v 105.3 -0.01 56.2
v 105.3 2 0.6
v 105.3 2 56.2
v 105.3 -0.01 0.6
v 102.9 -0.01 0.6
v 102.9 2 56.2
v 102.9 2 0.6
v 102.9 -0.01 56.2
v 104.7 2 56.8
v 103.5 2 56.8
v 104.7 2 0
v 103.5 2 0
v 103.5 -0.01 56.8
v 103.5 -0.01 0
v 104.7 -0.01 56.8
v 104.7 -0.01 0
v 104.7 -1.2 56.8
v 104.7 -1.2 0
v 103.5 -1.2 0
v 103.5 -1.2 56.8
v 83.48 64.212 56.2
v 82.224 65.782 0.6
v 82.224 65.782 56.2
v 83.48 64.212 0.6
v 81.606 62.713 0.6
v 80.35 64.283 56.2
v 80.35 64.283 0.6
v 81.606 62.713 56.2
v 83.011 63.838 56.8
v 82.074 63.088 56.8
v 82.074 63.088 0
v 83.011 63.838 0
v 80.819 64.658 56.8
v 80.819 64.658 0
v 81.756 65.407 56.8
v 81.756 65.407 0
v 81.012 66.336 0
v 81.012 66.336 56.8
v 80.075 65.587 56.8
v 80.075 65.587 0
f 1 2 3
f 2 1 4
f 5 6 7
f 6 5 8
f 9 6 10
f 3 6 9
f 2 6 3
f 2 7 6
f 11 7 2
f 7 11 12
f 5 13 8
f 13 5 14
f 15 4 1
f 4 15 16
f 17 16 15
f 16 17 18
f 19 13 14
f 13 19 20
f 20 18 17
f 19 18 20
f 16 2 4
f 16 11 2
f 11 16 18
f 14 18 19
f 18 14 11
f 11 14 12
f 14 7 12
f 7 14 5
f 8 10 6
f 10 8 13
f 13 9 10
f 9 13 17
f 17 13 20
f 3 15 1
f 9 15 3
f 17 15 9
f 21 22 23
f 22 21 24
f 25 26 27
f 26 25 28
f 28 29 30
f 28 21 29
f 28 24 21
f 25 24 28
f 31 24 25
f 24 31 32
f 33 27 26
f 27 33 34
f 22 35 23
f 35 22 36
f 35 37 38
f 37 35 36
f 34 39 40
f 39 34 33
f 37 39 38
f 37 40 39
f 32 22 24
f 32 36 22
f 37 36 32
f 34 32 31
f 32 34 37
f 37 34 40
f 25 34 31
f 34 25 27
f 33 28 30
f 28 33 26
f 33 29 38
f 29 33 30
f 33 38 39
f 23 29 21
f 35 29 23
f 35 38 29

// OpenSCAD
include <../lib/spool-drybox-lib.scad>;
$fn = 40;
panel_gasket("front");
